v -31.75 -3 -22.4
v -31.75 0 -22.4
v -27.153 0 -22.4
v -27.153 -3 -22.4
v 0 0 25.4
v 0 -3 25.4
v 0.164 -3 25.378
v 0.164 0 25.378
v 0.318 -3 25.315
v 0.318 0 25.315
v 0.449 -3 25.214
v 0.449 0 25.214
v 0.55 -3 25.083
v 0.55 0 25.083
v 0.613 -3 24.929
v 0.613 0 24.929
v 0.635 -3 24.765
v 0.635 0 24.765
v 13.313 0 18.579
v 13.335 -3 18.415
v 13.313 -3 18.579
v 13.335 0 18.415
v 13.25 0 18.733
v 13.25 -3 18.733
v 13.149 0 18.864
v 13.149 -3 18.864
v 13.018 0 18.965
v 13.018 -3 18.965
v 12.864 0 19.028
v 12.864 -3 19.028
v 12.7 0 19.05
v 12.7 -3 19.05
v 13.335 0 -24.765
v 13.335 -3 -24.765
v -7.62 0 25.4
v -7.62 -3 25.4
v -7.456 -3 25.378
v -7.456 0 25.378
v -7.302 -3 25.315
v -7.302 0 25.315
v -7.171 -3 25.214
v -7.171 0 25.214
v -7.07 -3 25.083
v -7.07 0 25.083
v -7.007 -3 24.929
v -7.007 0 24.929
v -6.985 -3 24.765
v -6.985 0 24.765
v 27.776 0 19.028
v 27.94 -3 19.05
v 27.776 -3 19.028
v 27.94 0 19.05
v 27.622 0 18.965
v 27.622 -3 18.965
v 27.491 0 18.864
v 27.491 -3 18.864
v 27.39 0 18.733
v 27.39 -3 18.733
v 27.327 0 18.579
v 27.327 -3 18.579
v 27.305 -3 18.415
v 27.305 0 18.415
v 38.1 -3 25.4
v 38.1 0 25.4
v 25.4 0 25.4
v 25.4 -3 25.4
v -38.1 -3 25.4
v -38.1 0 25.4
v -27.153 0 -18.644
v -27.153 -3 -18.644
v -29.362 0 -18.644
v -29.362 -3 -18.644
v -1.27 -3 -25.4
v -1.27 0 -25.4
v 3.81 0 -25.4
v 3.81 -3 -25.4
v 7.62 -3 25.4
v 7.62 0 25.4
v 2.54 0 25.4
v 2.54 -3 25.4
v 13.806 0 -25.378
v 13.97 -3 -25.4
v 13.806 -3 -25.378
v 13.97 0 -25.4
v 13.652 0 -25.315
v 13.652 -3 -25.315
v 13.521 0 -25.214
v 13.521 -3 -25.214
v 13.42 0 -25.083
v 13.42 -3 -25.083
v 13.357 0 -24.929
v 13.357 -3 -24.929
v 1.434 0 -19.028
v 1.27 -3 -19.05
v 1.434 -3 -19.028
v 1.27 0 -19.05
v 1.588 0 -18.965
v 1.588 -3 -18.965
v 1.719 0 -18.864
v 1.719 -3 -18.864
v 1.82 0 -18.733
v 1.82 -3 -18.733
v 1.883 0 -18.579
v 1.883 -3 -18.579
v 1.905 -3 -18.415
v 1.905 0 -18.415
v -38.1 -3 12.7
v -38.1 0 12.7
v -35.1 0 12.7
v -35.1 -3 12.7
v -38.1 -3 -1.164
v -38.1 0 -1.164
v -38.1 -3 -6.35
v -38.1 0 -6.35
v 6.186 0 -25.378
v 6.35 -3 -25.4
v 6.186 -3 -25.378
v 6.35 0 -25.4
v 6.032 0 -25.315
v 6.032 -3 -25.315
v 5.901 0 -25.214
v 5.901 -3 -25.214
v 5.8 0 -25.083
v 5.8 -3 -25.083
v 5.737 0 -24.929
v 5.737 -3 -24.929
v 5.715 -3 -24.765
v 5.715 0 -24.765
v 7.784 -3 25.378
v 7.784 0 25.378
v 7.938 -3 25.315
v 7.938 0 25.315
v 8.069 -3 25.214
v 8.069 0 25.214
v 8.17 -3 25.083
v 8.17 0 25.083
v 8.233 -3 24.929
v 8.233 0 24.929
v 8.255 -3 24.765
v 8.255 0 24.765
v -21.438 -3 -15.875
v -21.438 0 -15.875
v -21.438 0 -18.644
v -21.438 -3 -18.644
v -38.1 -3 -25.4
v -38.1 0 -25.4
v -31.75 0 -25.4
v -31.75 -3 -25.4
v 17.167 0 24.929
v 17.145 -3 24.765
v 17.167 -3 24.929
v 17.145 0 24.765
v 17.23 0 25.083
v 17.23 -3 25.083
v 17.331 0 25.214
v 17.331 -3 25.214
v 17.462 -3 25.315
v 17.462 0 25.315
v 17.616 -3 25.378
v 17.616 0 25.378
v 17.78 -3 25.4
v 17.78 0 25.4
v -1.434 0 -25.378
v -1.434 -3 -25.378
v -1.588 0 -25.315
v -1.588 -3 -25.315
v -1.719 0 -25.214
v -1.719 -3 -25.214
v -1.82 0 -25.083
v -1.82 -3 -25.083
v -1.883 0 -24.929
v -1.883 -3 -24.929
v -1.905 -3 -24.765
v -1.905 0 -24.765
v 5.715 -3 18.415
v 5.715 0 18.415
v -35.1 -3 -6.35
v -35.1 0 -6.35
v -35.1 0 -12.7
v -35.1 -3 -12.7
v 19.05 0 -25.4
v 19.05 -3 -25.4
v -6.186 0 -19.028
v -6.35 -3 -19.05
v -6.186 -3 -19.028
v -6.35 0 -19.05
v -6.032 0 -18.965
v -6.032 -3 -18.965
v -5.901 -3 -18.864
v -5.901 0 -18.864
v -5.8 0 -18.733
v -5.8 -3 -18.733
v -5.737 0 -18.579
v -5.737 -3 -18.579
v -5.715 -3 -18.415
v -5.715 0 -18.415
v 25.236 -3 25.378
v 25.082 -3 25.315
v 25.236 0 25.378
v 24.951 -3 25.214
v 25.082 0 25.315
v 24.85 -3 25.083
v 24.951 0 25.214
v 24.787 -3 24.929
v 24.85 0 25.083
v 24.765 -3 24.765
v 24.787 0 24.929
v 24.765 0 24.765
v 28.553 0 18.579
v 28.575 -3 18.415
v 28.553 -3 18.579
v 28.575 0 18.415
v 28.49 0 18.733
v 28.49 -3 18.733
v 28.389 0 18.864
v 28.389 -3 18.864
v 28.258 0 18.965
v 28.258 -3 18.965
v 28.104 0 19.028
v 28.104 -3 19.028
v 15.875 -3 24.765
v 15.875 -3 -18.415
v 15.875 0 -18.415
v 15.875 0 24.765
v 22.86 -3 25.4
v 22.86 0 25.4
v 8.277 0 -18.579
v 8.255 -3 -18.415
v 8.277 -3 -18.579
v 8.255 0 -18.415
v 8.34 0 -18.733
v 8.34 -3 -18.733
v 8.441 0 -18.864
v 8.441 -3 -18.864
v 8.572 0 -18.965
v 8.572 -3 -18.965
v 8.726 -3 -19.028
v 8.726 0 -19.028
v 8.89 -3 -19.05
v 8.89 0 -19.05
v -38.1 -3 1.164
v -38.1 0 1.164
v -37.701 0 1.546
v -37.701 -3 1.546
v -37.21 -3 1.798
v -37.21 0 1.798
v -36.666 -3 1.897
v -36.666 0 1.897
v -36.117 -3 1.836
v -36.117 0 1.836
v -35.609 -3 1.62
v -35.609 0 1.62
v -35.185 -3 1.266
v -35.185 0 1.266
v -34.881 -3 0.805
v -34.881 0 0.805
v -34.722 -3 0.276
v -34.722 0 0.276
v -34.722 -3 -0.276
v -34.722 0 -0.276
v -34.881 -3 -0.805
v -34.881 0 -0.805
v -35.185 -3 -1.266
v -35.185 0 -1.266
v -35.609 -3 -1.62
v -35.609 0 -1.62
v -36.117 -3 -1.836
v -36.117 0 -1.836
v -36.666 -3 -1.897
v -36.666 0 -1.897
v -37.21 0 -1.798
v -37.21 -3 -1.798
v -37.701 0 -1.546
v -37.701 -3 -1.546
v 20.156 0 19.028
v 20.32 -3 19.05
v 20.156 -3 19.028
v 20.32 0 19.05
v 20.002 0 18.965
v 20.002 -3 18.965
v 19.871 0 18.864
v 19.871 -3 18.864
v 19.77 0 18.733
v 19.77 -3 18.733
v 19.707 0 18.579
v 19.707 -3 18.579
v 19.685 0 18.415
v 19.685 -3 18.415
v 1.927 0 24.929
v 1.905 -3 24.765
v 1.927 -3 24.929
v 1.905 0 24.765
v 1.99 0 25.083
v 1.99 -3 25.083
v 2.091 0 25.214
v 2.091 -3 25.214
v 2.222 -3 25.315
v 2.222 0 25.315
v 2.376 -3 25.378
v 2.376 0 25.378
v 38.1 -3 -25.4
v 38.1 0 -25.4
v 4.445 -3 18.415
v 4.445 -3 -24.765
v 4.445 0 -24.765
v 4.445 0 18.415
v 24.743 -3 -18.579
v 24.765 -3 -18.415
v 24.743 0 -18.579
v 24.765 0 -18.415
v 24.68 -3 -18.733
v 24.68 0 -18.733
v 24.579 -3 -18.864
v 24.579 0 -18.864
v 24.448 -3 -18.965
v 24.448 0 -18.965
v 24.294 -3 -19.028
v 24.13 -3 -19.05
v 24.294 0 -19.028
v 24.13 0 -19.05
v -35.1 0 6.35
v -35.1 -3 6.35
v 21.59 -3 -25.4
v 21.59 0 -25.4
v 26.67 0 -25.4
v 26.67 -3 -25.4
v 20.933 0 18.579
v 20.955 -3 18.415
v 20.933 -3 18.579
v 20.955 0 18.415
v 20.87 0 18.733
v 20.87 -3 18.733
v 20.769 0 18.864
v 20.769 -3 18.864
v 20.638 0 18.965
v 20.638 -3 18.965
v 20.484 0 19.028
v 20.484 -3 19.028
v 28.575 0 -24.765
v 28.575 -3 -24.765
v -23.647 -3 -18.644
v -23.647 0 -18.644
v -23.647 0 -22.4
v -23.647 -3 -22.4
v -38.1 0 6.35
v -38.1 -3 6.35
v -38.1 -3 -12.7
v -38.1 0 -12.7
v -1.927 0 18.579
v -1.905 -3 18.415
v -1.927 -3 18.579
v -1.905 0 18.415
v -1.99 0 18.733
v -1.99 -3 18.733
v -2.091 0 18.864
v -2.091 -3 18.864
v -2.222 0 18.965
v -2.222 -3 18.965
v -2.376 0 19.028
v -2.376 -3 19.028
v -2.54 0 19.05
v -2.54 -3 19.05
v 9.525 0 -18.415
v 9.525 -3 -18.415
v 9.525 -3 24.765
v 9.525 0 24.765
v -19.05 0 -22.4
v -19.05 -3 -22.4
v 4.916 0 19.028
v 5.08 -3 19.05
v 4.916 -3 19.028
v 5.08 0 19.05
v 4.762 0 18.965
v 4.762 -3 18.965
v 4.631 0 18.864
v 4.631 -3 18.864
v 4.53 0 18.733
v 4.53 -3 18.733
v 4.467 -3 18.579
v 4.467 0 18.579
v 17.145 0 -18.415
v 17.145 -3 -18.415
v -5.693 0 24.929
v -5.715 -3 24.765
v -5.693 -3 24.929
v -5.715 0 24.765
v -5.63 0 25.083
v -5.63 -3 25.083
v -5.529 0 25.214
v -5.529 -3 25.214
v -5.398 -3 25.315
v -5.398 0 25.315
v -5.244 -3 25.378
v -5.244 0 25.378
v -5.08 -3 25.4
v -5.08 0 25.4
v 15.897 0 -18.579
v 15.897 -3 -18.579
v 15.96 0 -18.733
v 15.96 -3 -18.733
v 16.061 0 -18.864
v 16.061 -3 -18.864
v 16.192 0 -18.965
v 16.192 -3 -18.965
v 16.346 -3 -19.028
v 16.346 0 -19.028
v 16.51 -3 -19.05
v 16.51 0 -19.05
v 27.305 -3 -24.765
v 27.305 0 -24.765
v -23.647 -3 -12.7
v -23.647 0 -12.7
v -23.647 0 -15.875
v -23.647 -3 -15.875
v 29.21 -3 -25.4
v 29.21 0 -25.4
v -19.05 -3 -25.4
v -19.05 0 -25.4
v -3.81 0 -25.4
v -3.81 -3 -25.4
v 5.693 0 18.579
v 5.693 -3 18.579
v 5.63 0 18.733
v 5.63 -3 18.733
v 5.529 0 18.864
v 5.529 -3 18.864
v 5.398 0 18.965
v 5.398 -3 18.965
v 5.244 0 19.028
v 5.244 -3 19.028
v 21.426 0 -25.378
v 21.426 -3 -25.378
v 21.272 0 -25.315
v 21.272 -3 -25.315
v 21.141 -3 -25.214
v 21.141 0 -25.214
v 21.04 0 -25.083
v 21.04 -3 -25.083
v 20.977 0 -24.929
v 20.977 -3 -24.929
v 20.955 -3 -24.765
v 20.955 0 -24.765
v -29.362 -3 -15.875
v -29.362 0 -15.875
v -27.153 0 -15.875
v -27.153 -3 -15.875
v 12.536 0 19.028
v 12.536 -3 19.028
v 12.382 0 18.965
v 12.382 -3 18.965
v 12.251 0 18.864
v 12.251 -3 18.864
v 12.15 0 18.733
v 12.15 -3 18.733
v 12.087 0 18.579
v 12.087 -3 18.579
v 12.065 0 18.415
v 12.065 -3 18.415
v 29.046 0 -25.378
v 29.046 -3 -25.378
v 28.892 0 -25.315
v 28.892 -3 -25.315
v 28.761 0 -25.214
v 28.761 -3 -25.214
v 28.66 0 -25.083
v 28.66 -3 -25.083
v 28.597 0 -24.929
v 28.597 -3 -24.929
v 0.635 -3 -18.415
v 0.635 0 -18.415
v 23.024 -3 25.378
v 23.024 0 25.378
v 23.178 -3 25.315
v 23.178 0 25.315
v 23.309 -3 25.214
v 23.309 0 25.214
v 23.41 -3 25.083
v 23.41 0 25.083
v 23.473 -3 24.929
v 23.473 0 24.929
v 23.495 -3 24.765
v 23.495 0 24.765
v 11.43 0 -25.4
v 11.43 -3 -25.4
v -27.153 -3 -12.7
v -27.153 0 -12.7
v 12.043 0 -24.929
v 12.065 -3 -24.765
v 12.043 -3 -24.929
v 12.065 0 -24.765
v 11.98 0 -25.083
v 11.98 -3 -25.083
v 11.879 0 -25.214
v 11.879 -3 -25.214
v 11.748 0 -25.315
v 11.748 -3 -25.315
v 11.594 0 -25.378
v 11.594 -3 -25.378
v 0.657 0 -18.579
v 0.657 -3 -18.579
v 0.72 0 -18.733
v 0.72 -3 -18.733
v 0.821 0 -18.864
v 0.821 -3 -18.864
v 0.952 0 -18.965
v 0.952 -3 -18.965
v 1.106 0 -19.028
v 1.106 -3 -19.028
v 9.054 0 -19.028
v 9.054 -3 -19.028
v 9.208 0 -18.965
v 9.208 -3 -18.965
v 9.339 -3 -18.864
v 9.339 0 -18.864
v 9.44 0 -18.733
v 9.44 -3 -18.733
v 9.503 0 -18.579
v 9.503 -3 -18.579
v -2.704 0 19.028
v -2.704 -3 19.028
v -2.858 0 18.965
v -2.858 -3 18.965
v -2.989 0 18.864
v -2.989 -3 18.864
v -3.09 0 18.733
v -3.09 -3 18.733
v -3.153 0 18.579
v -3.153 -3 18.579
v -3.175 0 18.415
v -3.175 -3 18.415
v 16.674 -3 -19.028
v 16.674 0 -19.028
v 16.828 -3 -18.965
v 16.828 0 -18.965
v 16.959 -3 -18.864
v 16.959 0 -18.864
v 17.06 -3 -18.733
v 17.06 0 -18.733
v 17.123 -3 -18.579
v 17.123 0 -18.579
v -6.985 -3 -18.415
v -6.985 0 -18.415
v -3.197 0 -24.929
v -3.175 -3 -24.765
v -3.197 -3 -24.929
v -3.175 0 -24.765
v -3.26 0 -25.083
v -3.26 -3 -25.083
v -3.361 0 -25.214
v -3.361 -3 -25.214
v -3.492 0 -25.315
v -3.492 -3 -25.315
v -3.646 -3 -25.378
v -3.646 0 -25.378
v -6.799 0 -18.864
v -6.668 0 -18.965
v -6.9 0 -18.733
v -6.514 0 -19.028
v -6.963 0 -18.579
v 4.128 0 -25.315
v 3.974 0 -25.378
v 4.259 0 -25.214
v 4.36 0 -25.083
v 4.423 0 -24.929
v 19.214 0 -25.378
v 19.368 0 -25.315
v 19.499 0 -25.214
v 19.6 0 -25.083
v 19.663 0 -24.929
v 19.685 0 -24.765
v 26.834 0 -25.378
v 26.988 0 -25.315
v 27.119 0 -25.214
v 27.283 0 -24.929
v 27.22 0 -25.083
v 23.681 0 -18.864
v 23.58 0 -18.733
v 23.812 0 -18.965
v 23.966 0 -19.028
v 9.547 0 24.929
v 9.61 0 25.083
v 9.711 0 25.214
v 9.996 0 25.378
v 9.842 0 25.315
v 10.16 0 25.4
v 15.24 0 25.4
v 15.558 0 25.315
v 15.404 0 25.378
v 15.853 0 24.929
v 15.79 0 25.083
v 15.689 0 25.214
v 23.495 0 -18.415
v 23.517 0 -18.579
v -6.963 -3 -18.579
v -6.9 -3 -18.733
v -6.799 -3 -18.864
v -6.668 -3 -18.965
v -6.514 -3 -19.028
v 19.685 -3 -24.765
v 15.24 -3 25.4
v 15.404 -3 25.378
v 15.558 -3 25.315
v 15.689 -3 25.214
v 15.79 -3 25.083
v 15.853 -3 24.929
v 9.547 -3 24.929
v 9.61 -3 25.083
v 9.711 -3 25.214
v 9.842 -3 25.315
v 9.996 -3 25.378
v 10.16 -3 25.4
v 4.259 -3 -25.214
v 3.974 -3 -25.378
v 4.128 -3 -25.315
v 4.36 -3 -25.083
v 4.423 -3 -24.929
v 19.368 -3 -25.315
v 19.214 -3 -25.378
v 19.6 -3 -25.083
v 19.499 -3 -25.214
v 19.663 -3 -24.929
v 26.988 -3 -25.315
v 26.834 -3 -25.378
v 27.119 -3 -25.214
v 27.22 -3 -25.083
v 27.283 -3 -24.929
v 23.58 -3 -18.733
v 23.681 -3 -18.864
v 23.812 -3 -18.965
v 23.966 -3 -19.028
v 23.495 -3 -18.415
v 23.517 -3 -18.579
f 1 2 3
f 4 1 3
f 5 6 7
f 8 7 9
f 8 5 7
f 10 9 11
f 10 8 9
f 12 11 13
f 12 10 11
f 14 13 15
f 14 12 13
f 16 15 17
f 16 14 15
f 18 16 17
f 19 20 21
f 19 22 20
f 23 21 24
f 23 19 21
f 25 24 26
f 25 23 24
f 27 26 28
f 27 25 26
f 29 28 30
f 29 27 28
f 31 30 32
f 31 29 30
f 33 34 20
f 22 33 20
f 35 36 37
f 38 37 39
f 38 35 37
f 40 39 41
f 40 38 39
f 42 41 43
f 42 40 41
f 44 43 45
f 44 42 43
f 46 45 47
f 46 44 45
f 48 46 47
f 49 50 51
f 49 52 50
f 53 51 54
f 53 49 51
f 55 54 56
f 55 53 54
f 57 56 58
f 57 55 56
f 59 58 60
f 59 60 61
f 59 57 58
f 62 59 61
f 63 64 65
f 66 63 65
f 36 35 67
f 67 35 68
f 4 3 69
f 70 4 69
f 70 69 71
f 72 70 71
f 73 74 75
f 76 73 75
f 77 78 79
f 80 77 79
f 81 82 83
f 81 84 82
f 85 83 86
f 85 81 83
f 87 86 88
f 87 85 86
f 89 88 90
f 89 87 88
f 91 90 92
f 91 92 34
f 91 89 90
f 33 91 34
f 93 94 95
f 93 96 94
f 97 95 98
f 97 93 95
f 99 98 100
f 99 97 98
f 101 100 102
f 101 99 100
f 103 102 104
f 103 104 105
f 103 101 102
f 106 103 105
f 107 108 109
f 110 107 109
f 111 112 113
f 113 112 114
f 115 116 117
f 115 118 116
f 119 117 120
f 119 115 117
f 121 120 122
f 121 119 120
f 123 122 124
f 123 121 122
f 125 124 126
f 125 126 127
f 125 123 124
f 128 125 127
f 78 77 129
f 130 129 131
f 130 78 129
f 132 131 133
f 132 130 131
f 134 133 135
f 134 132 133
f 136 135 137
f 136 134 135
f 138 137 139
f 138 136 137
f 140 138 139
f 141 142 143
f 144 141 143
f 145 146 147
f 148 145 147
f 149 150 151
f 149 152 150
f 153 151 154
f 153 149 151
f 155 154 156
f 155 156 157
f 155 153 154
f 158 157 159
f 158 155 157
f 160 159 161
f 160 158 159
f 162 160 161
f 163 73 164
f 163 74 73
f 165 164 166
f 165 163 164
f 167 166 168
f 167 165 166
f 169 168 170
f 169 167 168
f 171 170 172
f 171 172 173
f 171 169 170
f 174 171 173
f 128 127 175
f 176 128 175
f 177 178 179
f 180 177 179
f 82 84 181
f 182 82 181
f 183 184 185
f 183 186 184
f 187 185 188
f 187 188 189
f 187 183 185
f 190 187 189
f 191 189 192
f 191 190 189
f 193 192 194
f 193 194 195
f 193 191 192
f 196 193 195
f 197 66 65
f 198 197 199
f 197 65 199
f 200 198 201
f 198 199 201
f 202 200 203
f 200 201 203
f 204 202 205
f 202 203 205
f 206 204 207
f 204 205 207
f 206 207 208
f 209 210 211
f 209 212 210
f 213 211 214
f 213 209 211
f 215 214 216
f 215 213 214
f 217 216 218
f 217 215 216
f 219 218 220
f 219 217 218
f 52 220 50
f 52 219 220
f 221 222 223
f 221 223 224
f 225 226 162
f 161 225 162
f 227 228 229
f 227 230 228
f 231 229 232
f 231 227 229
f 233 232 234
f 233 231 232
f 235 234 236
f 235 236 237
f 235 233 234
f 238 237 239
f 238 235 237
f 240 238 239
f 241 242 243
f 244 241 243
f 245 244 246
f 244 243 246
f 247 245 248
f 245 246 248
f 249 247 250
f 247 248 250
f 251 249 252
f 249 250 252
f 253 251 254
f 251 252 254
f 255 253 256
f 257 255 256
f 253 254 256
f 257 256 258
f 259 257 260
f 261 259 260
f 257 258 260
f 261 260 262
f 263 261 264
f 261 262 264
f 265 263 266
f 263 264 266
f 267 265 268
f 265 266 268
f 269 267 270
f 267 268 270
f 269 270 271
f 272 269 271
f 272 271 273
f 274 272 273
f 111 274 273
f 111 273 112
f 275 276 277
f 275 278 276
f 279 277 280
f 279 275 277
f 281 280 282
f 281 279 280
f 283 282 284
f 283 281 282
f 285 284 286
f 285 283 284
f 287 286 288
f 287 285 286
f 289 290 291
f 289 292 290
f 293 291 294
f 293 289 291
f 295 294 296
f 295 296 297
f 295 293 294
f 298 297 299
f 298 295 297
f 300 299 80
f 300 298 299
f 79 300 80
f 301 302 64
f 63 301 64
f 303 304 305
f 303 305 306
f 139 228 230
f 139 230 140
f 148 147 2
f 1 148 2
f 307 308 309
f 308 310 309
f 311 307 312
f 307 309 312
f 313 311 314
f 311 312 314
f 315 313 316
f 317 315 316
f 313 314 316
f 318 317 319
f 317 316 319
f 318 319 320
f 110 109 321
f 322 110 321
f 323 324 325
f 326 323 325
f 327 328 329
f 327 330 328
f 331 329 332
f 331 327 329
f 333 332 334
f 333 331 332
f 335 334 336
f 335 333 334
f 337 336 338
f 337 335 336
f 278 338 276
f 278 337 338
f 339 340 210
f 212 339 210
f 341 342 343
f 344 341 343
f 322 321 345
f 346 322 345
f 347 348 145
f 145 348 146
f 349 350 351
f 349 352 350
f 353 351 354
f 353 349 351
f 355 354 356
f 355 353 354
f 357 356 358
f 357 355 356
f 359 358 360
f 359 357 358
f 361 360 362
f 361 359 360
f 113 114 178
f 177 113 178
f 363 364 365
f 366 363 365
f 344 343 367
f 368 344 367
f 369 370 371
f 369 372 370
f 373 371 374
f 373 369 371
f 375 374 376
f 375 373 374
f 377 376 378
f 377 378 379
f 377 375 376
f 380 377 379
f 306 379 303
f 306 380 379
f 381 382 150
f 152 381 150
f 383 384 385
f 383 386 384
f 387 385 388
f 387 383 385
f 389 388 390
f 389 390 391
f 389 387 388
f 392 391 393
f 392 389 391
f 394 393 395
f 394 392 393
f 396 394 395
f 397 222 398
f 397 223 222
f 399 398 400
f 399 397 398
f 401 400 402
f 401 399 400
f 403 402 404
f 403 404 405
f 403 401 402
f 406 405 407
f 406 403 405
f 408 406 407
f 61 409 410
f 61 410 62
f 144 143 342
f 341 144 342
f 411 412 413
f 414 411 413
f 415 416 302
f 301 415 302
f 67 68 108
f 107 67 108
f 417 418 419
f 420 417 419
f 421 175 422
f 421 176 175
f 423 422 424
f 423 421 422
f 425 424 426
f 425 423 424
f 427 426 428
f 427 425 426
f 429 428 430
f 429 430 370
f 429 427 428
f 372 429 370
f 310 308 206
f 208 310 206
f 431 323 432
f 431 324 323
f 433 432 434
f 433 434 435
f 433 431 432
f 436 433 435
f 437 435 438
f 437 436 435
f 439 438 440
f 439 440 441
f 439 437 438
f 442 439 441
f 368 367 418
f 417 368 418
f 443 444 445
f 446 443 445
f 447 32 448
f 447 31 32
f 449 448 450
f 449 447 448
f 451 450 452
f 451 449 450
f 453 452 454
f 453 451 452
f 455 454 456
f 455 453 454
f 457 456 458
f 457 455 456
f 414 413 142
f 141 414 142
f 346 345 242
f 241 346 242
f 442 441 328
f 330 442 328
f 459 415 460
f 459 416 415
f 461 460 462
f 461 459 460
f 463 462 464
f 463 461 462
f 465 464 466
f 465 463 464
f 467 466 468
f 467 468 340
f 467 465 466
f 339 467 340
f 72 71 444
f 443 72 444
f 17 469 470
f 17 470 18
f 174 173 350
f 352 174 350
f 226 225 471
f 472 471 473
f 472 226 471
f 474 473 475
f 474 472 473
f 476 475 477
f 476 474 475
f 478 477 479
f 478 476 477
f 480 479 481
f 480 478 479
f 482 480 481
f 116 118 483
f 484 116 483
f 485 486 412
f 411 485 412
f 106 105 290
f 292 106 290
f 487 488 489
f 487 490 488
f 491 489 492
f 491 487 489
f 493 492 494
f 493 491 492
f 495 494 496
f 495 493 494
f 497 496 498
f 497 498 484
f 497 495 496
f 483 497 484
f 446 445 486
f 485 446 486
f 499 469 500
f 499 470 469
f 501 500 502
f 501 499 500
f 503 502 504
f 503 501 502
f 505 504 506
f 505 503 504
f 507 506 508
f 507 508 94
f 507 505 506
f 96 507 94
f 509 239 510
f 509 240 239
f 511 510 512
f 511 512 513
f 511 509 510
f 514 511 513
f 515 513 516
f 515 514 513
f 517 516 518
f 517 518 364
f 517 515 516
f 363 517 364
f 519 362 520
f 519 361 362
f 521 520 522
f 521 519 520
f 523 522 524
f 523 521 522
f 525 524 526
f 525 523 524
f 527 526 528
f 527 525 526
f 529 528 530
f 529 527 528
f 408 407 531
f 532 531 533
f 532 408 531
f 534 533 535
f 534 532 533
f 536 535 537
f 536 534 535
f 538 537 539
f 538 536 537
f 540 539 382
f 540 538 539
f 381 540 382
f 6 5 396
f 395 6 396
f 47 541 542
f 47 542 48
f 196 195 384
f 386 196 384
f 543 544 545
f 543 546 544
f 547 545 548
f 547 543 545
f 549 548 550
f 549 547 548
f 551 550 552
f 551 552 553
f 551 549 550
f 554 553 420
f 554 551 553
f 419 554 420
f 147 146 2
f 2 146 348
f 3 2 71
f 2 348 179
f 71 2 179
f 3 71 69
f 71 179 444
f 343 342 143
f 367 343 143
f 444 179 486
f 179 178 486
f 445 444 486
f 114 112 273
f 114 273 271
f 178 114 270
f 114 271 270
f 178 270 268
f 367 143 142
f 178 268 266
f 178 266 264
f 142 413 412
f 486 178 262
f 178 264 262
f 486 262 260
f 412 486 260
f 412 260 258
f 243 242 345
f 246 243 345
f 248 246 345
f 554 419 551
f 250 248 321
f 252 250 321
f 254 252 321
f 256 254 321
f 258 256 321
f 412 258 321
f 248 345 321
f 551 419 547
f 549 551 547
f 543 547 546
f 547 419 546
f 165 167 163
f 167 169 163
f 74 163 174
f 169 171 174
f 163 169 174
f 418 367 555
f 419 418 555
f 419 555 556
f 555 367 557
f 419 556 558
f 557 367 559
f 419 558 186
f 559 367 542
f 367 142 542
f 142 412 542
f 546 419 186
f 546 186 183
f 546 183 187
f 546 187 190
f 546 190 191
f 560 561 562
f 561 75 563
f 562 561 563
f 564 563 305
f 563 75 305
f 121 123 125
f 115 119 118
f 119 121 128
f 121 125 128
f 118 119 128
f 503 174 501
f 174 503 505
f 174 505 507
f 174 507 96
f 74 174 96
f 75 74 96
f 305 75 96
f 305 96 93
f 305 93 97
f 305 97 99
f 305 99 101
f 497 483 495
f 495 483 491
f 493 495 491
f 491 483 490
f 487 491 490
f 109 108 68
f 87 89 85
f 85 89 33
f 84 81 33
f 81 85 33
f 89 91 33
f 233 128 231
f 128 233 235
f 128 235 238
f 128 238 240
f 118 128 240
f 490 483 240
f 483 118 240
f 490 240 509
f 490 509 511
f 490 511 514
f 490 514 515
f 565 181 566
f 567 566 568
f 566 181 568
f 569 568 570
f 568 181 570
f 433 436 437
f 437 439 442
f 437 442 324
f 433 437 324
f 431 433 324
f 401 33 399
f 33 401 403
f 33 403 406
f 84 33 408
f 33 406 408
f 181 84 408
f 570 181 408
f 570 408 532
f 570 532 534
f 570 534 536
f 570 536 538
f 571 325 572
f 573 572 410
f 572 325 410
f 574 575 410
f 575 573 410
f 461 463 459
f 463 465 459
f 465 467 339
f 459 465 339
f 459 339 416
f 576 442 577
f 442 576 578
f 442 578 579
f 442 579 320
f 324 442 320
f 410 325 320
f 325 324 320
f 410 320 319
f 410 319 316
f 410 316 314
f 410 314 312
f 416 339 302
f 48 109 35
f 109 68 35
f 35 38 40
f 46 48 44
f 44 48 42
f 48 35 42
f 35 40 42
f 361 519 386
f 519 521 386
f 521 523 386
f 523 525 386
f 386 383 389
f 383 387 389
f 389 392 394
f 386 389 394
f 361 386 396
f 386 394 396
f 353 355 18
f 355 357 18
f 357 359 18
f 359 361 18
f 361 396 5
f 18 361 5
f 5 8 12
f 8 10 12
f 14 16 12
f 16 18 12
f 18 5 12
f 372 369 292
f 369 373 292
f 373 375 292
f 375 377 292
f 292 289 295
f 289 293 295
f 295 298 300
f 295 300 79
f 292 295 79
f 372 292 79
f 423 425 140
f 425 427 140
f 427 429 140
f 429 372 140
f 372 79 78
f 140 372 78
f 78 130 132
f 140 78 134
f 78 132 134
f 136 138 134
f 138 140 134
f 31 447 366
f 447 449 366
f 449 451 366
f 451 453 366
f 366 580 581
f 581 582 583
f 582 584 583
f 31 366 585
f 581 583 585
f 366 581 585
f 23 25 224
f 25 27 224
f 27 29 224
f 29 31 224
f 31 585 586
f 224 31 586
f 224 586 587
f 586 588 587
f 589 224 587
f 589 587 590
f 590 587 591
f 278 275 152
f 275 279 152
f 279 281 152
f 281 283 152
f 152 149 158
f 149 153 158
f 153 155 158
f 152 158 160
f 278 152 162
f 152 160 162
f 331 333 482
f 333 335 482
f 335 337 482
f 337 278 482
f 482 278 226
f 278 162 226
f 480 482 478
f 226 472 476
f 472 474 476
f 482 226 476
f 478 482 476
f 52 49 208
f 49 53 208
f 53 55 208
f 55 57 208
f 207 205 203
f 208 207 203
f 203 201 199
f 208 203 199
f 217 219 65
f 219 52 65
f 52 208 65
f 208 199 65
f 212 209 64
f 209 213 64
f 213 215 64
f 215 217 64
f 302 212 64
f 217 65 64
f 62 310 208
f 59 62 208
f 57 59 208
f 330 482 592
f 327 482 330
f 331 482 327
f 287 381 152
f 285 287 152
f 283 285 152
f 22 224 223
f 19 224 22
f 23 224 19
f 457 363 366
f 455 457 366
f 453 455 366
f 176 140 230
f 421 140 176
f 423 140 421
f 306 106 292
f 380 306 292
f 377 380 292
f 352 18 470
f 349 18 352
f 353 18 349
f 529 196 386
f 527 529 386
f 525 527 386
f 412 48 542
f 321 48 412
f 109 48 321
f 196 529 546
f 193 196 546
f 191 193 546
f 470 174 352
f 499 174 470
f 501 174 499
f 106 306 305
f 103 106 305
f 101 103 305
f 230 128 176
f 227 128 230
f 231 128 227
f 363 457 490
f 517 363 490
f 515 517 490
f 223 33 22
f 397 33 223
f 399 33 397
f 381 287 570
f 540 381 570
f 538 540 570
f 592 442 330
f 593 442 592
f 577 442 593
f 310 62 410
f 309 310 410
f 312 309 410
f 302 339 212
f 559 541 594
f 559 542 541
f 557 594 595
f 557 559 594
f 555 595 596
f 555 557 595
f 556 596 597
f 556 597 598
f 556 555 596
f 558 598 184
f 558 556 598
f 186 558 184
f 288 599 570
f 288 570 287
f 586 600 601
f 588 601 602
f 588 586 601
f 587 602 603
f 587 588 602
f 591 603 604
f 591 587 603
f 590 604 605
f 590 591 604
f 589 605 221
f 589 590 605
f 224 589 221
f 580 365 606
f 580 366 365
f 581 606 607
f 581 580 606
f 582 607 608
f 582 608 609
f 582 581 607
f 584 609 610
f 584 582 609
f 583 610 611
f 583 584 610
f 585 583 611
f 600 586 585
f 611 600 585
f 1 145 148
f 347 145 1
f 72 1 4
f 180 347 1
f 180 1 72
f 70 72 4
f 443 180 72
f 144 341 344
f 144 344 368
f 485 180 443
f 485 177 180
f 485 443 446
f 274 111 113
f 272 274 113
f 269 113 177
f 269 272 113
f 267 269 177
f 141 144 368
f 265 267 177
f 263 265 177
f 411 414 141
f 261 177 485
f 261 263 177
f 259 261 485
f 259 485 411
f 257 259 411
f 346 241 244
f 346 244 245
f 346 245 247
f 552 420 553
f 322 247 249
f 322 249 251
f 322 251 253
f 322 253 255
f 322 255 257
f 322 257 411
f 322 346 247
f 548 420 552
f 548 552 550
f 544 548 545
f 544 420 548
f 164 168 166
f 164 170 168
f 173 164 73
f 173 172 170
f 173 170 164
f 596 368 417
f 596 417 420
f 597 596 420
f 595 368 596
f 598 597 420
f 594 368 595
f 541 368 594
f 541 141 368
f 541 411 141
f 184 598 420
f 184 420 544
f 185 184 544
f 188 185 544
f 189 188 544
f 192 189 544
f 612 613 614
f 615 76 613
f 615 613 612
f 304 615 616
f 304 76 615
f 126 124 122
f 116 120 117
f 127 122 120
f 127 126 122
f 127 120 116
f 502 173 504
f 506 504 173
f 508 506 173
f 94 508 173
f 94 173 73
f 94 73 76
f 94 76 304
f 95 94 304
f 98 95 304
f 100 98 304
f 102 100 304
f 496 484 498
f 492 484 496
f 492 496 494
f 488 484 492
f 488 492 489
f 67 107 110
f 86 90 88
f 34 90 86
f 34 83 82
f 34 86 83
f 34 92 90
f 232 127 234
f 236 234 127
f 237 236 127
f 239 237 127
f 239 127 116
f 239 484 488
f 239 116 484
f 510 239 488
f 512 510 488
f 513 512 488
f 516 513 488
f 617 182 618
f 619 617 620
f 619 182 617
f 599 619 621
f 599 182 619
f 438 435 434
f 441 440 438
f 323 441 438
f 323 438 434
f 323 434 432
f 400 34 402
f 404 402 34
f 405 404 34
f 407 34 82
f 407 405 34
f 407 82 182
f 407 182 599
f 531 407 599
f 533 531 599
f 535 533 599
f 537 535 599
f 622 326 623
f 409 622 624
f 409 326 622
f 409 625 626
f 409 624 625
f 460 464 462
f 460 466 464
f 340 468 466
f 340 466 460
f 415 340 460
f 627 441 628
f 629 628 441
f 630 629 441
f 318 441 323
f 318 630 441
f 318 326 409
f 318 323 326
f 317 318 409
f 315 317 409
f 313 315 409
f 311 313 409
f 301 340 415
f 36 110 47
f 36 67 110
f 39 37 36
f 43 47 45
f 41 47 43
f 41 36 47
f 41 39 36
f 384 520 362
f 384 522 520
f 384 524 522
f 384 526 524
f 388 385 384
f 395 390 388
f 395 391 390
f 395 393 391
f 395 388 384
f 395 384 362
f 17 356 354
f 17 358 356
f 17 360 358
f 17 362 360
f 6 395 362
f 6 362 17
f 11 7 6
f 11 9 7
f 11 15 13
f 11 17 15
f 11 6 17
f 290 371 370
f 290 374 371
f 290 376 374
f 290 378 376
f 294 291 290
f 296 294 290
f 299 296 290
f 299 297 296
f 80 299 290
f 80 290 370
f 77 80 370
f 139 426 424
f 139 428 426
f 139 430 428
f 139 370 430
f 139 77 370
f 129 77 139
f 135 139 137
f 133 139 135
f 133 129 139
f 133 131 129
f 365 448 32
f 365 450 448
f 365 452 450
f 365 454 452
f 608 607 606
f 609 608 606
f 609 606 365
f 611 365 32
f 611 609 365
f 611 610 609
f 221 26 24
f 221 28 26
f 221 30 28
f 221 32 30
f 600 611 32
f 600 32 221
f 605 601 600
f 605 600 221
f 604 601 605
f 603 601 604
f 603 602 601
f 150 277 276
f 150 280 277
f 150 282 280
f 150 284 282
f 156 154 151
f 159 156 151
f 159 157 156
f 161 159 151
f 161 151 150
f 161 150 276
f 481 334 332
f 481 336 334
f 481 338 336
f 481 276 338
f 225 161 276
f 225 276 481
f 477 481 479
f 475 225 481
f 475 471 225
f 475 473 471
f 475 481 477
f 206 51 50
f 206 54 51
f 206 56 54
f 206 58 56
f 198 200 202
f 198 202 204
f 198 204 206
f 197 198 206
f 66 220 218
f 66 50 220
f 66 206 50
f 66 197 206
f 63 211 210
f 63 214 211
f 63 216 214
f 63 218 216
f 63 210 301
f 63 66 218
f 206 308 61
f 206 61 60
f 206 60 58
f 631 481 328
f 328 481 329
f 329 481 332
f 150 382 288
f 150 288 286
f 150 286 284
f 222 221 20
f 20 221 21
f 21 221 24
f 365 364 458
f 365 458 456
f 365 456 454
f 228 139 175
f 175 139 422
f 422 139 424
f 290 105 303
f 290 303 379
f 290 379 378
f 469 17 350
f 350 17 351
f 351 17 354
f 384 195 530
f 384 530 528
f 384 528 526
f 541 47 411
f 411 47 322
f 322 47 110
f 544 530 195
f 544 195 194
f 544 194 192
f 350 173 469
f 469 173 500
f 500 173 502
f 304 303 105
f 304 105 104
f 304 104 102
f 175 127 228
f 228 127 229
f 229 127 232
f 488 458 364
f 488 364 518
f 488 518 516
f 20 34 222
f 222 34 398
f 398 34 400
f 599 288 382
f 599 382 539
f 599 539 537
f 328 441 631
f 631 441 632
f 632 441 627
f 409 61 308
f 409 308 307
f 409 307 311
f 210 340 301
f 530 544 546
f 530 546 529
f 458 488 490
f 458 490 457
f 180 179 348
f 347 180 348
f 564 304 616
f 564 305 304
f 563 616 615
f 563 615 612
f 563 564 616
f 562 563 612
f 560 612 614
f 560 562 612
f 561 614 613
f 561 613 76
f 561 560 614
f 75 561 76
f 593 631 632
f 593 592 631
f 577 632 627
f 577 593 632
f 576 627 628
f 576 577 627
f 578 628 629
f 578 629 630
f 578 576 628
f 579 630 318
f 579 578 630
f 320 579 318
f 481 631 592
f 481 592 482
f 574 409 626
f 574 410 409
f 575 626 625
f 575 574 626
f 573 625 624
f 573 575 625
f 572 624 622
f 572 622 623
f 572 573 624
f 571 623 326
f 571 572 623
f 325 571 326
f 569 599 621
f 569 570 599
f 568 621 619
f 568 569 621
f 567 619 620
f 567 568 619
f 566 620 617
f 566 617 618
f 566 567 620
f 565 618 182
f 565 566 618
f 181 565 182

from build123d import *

# Parameters (mm, degrees)
F1_DEPTH = 3
F3_D     = 3.7973
F4_W     = 1.27
F4_H     = 44.4500002354
F4_H_2   = 44.45
F5_DEPTH = 3.001
F6_R     = 0.63499


# Not quite as in the source:
# - a fillet or chamfer is up to 0.001 mm smaller than in the source, because OpenCascade refuses the exact size


with BuildPart() as f1:
    # F0 (on Front) → F1 (new body)
    with BuildSketch(Plane.XZ):
        Polygon((38.1, 25.4), (-38.1, 25.4), (-38.1, 12.7), (-35.1, 12.7), (-35.1, 6.35), (-38.1, 6.35), (-38.1, -6.35), (-35.1, -6.35), (-35.1, -12.7), (-38.1, -12.7), (-38.1, -25.4), (-31.75, -25.4), (-31.75, -22.4), (-27.1526, -22.4), (-27.1526, -18.6436), (-29.3624, -18.6436), (-29.3624, -15.875), (-27.1526, -15.875), (-27.1526, -12.7), (-23.6474, -12.7), (-23.6474, -15.875), (-21.4376, -15.875), (-21.4376, -18.6436), (-23.6474, -18.6436), (-23.6474, -22.4), (-19.05, -22.4), (-19.05, -25.4), (38.1, -25.4), align=None)
    extrude(amount=F1_DEPTH)

    # F3 (through all)
    with Locations(Plane.XZ.offset(3)):
        with Locations((-36.6, 0)):
            Hole(F3_D / 2)

    # F4 (on face) → F5 (cut, through all)
    with BuildSketch(Plane.XZ.offset(3)):
        with Locations((-6.3499999233, 3.1749998823)):
            Rectangle(F4_W, F4_H)
        with Locations((-2.5399999233, -3.175)):
            Rectangle(F4_W, F4_H_2)
        with Locations((5.0800000767, -3.175)):
            Rectangle(F4_W, F4_H_2)
        with Locations((1.2700000767, 3.1749998823)):
            Rectangle(F4_W, F4_H)
        with Locations((12.7000000767, -3.175)):
            Rectangle(F4_W, F4_H_2)
        with Locations((8.8900000767, 3.1749998823)):
            Rectangle(F4_W, F4_H)
        with Locations((20.3200000767, -3.175)):
            Rectangle(F4_W, F4_H_2)
        with Locations((16.5100000767, 3.1749998823)):
            Rectangle(F4_W, F4_H)
        with Locations((27.9400000767, -3.175)):
            Rectangle(F4_W, F4_H_2)
        with Locations((24.1300000767, 3.1749998823)):
            Rectangle(F4_W, F4_H)
    extrude(amount=-F5_DEPTH, mode=Mode.SUBTRACT)

    # F6 (radius 0.635 in the source; OpenCascade refuses exactly that, so slightly less here)
    f6_edges = [f1.edges().sort_by_distance(p)[0] for p in [
        (-6.985, -1.5, -19.05),
        (-5.715, -1.5, -19.05),
        (0.635, -1.5, -19.05),
        (1.905, -1.5, -19.05),
        (9.525, -1.5, -19.05),
        (8.255, -1.5, -19.05),
        (15.875, -1.5, -19.05),
        (17.145, -1.5, -19.05),
        (24.765, -1.5, -19.05),
        (23.495, -1.5, -19.05),
        (-3.175, -1.5, 19.05),
        (4.445, -1.5, 19.05),
        (12.065, -1.5, 19.05),
        (19.685, -1.5, 19.05),
        (27.305, -1.5, 19.05),
        (-1.905, -1.5, 19.05),
        (5.715, -1.5, 19.05),
        (13.335, -1.5, 19.05),
        (20.955, -1.5, 19.05),
        (28.575, -1.5, 19.05),
        (-1.905, -1.5, -25.4),
        (4.445, -1.5, -25.4),
        (5.715, -1.5, -25.4),
        (12.065, -1.5, -25.4),
        (13.335, -1.5, -25.4),
        (19.685, -1.5, -25.4),
        (20.955, -1.5, -25.4),
        (27.305, -1.5, -25.4),
        (28.575, -1.5, -25.4),
        (-6.985, -1.5, 25.4),
        (-5.715, -1.5, 25.4),
        (-3.175, -1.5, -25.4),
        (0.635, -1.5, 25.4),
        (1.905, -1.5, 25.4),
        (8.255, -1.5, 25.4),
        (9.525, -1.5, 25.4),
        (15.875, -1.5, 25.4),
        (17.145, -1.5, 25.4),
        (23.495, -1.5, 25.4),
        (24.765, -1.5, 25.4),
    ]]
    fillet(f6_edges, radius=F6_R)


solid = f1.part
